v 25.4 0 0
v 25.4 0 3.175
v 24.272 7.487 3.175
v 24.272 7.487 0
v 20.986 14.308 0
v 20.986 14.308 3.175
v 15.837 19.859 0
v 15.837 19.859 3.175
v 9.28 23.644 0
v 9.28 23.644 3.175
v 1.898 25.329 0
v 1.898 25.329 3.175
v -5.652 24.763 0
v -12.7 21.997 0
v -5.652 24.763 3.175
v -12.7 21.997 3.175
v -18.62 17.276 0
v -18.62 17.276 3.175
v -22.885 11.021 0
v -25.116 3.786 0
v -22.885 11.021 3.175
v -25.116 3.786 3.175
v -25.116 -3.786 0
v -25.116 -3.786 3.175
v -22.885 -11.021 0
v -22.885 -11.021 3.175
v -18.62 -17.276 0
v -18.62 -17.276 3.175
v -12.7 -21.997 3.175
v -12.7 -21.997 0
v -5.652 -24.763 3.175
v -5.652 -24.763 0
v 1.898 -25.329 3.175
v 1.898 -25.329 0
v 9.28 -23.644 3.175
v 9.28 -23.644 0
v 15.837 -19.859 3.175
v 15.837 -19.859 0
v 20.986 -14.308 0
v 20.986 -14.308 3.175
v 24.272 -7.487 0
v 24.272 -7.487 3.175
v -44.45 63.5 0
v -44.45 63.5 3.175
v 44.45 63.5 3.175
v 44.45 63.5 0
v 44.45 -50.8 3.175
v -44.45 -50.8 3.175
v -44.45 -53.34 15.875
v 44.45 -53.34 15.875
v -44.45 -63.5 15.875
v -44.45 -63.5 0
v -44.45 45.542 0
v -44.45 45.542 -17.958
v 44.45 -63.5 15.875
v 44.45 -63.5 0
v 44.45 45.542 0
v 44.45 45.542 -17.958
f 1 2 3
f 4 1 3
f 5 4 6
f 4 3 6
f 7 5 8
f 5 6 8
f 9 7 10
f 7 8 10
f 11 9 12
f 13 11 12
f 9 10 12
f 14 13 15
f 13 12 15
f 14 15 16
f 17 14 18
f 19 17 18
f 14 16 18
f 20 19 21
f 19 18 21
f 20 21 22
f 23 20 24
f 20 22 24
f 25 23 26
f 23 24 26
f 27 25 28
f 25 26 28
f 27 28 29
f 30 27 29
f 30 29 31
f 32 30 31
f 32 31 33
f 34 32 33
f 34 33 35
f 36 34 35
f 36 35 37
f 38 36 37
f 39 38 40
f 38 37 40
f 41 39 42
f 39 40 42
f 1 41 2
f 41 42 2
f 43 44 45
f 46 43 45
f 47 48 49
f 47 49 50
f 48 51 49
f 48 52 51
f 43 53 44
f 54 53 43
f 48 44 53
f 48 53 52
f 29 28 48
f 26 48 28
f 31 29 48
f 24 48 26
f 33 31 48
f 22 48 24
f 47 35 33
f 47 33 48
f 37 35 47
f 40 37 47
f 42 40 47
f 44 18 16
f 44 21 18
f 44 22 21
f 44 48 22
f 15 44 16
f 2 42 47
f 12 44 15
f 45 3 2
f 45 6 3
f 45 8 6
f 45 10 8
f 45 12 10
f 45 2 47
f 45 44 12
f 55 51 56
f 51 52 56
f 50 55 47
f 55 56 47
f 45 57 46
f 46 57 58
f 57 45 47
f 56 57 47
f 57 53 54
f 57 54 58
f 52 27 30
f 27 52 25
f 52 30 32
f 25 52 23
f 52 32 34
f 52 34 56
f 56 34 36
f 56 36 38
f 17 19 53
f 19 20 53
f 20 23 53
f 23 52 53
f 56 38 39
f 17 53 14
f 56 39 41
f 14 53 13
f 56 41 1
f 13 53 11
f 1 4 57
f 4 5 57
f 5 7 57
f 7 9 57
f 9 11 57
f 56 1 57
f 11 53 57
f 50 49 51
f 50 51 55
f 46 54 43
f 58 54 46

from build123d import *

# Parameters (mm, degrees)
F0_W     = 88.9
F0_H     = 127
F1_DEPTH = 3.175
F2_W     = 88.9
F2_H     = 17.9578
F3_DEPTH = 17.9578
F4_SIZE  = 17.95779
F5_R     = 25.4
F6_DEPTH = 3.175
F7_W     = 88.9
F7_H     = 12.7
F8_DEPTH = 12.7
F9_SIZE2 = 12.69999
F9_SIZE  = 2.53999


# Not quite as in the source:
# - a fillet or chamfer is up to 0.001 mm smaller than in the source, because OpenCascade refuses the exact size


with BuildPart() as f1:
    # F0 (on Top) → F1 (new body)
    with BuildSketch(Plane.XY):
        Rectangle(F0_W, F0_H)
    extrude(amount=F1_DEPTH)

    # F2 (on face) → F3 (join)
    with BuildSketch(Plane(origin=(0, 0, 0), x_dir=(1, 0, 0), z_dir=(0, 0, -1))):
        with Locations((0, -54.5211)):
            Rectangle(F2_W, F2_H)
    extrude(amount=F3_DEPTH)

    # F4 (size 17.9578 in the source; OpenCascade refuses exactly that, so slightly less here)
    f4_edges = [f1.edges().sort_by_distance(p)[0] for p in [
        (0, 63.5, -17.9578),
    ]]
    chamfer(f4_edges, length=F4_SIZE)

    # F5 (on face) → F6 (cut)
    with BuildSketch(Plane.XY.offset(3.175)):
        Circle(F5_R)
    extrude(amount=-F6_DEPTH, mode=Mode.SUBTRACT)

    # F7 (on face) → F8 (join)
    with BuildSketch(Plane.XY.offset(3.175)):
        with Locations((0, -57.15)):
            Rectangle(F7_W, F7_H)
    extrude(amount=F8_DEPTH)

    # F9 (size 2.54 and 12.7 in the source; OpenCascade refuses exactly that, so slightly less here)
    f9_edges = [f1.edges().sort_by_distance(p)[0] for p in [
        (0, -50.8, 15.875),
    ]]
    f9_side = f1.faces().sort_by_distance((0, -57.15, 15.875))[0]
    chamfer(f9_edges, length=F9_SIZE, length2=F9_SIZE2, reference=f9_side)


solid = f1.part
